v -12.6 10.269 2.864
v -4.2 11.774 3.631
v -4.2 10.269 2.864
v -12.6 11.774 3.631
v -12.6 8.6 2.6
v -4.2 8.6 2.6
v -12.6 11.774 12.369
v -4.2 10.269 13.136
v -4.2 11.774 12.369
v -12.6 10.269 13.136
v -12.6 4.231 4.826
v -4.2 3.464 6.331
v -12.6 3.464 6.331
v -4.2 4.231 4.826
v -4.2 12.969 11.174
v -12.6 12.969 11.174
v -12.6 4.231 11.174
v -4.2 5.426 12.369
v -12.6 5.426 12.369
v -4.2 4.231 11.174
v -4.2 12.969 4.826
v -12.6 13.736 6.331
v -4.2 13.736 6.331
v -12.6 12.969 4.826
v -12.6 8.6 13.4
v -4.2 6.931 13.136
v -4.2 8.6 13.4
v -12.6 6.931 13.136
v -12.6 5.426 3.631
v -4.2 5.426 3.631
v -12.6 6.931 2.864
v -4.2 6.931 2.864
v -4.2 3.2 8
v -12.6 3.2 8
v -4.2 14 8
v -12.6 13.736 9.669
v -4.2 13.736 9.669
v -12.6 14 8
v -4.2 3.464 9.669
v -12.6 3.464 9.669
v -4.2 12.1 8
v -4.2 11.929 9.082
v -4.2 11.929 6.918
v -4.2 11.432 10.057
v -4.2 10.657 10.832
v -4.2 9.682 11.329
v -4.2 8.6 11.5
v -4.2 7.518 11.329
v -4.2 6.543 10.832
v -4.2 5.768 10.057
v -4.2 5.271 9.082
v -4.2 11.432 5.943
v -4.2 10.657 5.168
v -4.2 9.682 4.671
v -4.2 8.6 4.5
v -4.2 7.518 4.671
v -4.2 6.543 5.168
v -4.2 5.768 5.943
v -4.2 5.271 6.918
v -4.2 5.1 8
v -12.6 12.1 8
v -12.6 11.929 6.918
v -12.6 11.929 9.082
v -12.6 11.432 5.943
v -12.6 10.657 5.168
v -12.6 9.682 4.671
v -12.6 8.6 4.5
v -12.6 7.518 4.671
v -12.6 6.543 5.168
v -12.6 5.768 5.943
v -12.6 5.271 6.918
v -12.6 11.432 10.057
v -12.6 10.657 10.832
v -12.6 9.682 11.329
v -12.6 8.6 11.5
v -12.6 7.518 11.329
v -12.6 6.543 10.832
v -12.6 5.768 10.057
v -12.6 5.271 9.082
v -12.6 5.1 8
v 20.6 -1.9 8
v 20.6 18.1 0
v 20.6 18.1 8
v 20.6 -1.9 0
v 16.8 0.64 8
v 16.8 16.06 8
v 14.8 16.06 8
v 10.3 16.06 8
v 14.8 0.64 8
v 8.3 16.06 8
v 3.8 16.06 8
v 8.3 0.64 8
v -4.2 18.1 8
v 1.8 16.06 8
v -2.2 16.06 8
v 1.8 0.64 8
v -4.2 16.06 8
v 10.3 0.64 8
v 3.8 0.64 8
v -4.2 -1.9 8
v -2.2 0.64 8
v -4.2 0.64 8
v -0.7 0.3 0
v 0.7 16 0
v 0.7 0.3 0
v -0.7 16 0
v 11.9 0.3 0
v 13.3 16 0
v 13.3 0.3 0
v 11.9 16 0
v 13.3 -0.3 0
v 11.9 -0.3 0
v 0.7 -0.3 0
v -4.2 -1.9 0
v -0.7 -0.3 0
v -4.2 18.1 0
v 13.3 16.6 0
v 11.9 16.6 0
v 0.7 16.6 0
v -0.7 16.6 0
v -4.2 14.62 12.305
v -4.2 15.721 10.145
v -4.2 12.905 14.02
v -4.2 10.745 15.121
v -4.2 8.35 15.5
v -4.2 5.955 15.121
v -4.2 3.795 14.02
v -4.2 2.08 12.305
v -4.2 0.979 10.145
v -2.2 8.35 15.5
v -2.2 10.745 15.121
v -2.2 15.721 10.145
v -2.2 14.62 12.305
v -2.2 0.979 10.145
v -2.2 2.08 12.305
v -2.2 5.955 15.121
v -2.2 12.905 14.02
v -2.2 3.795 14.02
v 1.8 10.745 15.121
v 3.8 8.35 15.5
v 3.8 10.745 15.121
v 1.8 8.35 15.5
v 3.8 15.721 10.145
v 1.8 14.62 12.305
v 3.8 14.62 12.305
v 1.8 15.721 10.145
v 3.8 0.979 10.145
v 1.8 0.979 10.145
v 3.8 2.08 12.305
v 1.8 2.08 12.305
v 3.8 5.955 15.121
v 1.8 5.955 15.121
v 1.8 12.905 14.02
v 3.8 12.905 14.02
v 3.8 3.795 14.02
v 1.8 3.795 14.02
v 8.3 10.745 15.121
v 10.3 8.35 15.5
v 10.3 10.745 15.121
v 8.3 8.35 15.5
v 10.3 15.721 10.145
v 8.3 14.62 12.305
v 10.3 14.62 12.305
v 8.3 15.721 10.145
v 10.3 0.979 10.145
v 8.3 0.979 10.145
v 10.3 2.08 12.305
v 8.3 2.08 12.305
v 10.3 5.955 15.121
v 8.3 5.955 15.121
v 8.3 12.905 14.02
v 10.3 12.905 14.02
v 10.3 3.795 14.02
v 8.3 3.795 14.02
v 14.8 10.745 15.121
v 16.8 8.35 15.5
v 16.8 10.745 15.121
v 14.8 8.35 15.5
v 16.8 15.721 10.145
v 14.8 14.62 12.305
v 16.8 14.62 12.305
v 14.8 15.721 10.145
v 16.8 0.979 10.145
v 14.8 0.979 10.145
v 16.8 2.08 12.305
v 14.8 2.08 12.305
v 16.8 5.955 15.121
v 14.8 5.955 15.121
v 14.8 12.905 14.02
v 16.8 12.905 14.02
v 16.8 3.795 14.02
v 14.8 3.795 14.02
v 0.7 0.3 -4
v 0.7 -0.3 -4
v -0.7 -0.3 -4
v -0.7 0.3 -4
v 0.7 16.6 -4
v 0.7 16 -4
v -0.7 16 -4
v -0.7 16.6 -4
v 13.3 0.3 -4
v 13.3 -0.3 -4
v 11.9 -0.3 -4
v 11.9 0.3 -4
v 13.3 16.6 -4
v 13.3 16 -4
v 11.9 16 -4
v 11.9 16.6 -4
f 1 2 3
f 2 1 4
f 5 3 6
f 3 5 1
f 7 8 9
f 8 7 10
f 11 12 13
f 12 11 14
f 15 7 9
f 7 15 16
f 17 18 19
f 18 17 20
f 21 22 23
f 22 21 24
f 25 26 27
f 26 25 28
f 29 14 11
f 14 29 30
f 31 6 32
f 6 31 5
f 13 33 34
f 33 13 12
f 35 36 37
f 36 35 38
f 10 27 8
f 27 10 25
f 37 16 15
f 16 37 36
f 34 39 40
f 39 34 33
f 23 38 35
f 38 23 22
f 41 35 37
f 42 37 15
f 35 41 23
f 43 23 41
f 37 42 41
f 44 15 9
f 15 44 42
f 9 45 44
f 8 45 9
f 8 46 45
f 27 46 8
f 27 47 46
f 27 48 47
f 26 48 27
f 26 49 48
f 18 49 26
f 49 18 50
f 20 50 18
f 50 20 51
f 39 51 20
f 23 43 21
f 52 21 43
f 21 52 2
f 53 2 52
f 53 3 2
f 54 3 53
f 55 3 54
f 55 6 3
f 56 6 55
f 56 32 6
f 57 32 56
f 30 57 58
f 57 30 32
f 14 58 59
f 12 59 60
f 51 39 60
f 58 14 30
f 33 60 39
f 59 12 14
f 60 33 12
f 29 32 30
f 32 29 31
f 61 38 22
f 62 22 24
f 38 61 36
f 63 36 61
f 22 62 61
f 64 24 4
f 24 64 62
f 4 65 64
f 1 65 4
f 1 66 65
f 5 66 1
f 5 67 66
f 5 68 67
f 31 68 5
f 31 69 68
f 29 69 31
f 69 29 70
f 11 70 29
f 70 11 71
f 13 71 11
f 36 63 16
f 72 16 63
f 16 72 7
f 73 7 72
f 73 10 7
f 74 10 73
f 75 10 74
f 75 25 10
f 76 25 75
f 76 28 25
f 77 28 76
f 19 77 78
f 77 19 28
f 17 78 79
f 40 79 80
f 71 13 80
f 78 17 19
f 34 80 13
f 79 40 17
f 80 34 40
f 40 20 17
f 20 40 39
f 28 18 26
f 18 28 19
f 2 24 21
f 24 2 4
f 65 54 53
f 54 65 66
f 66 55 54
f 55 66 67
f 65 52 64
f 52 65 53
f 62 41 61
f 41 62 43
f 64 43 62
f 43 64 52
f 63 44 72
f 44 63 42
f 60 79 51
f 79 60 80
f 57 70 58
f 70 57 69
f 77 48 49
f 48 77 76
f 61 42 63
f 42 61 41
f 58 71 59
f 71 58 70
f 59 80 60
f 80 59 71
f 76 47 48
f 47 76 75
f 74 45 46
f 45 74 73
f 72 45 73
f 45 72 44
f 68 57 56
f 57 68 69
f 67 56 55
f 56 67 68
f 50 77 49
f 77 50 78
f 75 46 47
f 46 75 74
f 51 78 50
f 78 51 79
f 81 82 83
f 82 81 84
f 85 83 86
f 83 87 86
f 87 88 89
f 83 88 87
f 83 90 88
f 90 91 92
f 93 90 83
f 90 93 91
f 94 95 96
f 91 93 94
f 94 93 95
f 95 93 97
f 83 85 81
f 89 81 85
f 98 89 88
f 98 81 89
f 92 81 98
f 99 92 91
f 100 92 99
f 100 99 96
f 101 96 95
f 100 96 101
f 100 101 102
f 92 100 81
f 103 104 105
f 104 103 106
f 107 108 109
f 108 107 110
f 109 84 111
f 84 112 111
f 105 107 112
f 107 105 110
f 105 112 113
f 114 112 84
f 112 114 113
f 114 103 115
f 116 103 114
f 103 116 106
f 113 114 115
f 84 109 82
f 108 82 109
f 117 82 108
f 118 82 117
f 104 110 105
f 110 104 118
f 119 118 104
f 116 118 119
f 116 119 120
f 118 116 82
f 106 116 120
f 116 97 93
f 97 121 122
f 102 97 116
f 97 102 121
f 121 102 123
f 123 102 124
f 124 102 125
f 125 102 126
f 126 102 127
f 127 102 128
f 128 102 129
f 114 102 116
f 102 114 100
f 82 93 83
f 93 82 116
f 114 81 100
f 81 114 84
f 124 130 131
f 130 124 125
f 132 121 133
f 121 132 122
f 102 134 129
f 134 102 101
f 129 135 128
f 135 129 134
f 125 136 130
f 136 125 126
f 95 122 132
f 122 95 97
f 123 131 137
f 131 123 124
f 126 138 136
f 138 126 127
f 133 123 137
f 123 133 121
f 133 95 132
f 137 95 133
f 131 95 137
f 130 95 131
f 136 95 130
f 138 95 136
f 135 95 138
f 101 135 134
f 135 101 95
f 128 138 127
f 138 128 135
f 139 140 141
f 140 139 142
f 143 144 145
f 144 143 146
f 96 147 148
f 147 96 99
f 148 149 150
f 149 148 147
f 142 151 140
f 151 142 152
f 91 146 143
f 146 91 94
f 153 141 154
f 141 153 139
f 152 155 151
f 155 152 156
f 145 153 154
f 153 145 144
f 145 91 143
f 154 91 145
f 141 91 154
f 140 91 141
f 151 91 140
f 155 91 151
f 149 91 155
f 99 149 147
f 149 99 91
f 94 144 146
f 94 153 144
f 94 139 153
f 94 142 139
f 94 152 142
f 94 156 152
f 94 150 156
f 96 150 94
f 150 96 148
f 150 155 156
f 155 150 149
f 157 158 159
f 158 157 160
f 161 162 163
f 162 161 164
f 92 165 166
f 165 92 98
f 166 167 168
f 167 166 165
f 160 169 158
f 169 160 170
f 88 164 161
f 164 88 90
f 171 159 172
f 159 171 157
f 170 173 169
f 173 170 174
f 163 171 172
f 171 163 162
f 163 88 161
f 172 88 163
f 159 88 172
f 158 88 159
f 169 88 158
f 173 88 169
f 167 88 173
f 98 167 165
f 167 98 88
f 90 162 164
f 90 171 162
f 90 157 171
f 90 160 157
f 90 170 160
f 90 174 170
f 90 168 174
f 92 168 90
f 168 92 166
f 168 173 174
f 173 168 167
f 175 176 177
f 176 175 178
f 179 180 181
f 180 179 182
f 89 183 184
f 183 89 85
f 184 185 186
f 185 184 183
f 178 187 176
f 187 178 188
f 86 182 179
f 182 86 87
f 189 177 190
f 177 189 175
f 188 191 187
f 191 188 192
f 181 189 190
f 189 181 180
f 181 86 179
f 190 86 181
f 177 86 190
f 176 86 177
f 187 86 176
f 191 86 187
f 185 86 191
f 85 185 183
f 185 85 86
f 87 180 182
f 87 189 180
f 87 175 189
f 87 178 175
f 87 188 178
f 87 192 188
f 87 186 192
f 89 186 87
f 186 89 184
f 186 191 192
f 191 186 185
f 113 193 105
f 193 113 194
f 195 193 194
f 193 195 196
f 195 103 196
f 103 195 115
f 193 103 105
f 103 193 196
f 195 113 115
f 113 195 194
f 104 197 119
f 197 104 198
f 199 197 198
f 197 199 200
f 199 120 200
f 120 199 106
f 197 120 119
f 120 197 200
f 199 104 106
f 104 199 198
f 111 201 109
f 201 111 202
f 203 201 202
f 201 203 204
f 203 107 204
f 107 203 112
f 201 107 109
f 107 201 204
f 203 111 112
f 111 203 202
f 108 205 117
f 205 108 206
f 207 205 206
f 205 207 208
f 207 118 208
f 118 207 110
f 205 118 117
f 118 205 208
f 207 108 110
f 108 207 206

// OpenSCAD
$fn=20;
module pin(x,y) {
    translate([x,y,0])translate([-0.7,-0.3,-4])cube([1.4,0.6,4]);
}

lPitch=16.8-10.5;
wPitch=16.3;

union() {
    pin(0,0);
    pin(0,wPitch);
    pin(2*lPitch,0);
    pin(2*lPitch,wPitch);

    translate([-4.2, -1.9, 0]) {
        color("gray")cube([24.8,20,8]);
        translate([-8.4, 5.5+5, 5.5+2.5])rotate([0,90,0])
        difference(){
            cylinder(r=5.4,h=8.4);
            translate([0,0,-0.1])cylinder(r=3.5,h=8.5);
        }
        translate([0, 7.75+2.5, 7.75])rotate([0,90,0])color("gray")cylinder(r=7.75,h=2);
        translate([6, 7.75+2.5, 7.75])rotate([0,90,0])color("gray")cylinder(r=7.75,h=2);
        translate([12.5, 7.75+2.5, 7.75])rotate([0,90,0])color("gray")cylinder(r=7.75,h=2);
        translate([19, 7.75+2.5, 7.75])rotate([0,90,0])color("gray")cylinder(r=7.75,h=2);
    }
}
